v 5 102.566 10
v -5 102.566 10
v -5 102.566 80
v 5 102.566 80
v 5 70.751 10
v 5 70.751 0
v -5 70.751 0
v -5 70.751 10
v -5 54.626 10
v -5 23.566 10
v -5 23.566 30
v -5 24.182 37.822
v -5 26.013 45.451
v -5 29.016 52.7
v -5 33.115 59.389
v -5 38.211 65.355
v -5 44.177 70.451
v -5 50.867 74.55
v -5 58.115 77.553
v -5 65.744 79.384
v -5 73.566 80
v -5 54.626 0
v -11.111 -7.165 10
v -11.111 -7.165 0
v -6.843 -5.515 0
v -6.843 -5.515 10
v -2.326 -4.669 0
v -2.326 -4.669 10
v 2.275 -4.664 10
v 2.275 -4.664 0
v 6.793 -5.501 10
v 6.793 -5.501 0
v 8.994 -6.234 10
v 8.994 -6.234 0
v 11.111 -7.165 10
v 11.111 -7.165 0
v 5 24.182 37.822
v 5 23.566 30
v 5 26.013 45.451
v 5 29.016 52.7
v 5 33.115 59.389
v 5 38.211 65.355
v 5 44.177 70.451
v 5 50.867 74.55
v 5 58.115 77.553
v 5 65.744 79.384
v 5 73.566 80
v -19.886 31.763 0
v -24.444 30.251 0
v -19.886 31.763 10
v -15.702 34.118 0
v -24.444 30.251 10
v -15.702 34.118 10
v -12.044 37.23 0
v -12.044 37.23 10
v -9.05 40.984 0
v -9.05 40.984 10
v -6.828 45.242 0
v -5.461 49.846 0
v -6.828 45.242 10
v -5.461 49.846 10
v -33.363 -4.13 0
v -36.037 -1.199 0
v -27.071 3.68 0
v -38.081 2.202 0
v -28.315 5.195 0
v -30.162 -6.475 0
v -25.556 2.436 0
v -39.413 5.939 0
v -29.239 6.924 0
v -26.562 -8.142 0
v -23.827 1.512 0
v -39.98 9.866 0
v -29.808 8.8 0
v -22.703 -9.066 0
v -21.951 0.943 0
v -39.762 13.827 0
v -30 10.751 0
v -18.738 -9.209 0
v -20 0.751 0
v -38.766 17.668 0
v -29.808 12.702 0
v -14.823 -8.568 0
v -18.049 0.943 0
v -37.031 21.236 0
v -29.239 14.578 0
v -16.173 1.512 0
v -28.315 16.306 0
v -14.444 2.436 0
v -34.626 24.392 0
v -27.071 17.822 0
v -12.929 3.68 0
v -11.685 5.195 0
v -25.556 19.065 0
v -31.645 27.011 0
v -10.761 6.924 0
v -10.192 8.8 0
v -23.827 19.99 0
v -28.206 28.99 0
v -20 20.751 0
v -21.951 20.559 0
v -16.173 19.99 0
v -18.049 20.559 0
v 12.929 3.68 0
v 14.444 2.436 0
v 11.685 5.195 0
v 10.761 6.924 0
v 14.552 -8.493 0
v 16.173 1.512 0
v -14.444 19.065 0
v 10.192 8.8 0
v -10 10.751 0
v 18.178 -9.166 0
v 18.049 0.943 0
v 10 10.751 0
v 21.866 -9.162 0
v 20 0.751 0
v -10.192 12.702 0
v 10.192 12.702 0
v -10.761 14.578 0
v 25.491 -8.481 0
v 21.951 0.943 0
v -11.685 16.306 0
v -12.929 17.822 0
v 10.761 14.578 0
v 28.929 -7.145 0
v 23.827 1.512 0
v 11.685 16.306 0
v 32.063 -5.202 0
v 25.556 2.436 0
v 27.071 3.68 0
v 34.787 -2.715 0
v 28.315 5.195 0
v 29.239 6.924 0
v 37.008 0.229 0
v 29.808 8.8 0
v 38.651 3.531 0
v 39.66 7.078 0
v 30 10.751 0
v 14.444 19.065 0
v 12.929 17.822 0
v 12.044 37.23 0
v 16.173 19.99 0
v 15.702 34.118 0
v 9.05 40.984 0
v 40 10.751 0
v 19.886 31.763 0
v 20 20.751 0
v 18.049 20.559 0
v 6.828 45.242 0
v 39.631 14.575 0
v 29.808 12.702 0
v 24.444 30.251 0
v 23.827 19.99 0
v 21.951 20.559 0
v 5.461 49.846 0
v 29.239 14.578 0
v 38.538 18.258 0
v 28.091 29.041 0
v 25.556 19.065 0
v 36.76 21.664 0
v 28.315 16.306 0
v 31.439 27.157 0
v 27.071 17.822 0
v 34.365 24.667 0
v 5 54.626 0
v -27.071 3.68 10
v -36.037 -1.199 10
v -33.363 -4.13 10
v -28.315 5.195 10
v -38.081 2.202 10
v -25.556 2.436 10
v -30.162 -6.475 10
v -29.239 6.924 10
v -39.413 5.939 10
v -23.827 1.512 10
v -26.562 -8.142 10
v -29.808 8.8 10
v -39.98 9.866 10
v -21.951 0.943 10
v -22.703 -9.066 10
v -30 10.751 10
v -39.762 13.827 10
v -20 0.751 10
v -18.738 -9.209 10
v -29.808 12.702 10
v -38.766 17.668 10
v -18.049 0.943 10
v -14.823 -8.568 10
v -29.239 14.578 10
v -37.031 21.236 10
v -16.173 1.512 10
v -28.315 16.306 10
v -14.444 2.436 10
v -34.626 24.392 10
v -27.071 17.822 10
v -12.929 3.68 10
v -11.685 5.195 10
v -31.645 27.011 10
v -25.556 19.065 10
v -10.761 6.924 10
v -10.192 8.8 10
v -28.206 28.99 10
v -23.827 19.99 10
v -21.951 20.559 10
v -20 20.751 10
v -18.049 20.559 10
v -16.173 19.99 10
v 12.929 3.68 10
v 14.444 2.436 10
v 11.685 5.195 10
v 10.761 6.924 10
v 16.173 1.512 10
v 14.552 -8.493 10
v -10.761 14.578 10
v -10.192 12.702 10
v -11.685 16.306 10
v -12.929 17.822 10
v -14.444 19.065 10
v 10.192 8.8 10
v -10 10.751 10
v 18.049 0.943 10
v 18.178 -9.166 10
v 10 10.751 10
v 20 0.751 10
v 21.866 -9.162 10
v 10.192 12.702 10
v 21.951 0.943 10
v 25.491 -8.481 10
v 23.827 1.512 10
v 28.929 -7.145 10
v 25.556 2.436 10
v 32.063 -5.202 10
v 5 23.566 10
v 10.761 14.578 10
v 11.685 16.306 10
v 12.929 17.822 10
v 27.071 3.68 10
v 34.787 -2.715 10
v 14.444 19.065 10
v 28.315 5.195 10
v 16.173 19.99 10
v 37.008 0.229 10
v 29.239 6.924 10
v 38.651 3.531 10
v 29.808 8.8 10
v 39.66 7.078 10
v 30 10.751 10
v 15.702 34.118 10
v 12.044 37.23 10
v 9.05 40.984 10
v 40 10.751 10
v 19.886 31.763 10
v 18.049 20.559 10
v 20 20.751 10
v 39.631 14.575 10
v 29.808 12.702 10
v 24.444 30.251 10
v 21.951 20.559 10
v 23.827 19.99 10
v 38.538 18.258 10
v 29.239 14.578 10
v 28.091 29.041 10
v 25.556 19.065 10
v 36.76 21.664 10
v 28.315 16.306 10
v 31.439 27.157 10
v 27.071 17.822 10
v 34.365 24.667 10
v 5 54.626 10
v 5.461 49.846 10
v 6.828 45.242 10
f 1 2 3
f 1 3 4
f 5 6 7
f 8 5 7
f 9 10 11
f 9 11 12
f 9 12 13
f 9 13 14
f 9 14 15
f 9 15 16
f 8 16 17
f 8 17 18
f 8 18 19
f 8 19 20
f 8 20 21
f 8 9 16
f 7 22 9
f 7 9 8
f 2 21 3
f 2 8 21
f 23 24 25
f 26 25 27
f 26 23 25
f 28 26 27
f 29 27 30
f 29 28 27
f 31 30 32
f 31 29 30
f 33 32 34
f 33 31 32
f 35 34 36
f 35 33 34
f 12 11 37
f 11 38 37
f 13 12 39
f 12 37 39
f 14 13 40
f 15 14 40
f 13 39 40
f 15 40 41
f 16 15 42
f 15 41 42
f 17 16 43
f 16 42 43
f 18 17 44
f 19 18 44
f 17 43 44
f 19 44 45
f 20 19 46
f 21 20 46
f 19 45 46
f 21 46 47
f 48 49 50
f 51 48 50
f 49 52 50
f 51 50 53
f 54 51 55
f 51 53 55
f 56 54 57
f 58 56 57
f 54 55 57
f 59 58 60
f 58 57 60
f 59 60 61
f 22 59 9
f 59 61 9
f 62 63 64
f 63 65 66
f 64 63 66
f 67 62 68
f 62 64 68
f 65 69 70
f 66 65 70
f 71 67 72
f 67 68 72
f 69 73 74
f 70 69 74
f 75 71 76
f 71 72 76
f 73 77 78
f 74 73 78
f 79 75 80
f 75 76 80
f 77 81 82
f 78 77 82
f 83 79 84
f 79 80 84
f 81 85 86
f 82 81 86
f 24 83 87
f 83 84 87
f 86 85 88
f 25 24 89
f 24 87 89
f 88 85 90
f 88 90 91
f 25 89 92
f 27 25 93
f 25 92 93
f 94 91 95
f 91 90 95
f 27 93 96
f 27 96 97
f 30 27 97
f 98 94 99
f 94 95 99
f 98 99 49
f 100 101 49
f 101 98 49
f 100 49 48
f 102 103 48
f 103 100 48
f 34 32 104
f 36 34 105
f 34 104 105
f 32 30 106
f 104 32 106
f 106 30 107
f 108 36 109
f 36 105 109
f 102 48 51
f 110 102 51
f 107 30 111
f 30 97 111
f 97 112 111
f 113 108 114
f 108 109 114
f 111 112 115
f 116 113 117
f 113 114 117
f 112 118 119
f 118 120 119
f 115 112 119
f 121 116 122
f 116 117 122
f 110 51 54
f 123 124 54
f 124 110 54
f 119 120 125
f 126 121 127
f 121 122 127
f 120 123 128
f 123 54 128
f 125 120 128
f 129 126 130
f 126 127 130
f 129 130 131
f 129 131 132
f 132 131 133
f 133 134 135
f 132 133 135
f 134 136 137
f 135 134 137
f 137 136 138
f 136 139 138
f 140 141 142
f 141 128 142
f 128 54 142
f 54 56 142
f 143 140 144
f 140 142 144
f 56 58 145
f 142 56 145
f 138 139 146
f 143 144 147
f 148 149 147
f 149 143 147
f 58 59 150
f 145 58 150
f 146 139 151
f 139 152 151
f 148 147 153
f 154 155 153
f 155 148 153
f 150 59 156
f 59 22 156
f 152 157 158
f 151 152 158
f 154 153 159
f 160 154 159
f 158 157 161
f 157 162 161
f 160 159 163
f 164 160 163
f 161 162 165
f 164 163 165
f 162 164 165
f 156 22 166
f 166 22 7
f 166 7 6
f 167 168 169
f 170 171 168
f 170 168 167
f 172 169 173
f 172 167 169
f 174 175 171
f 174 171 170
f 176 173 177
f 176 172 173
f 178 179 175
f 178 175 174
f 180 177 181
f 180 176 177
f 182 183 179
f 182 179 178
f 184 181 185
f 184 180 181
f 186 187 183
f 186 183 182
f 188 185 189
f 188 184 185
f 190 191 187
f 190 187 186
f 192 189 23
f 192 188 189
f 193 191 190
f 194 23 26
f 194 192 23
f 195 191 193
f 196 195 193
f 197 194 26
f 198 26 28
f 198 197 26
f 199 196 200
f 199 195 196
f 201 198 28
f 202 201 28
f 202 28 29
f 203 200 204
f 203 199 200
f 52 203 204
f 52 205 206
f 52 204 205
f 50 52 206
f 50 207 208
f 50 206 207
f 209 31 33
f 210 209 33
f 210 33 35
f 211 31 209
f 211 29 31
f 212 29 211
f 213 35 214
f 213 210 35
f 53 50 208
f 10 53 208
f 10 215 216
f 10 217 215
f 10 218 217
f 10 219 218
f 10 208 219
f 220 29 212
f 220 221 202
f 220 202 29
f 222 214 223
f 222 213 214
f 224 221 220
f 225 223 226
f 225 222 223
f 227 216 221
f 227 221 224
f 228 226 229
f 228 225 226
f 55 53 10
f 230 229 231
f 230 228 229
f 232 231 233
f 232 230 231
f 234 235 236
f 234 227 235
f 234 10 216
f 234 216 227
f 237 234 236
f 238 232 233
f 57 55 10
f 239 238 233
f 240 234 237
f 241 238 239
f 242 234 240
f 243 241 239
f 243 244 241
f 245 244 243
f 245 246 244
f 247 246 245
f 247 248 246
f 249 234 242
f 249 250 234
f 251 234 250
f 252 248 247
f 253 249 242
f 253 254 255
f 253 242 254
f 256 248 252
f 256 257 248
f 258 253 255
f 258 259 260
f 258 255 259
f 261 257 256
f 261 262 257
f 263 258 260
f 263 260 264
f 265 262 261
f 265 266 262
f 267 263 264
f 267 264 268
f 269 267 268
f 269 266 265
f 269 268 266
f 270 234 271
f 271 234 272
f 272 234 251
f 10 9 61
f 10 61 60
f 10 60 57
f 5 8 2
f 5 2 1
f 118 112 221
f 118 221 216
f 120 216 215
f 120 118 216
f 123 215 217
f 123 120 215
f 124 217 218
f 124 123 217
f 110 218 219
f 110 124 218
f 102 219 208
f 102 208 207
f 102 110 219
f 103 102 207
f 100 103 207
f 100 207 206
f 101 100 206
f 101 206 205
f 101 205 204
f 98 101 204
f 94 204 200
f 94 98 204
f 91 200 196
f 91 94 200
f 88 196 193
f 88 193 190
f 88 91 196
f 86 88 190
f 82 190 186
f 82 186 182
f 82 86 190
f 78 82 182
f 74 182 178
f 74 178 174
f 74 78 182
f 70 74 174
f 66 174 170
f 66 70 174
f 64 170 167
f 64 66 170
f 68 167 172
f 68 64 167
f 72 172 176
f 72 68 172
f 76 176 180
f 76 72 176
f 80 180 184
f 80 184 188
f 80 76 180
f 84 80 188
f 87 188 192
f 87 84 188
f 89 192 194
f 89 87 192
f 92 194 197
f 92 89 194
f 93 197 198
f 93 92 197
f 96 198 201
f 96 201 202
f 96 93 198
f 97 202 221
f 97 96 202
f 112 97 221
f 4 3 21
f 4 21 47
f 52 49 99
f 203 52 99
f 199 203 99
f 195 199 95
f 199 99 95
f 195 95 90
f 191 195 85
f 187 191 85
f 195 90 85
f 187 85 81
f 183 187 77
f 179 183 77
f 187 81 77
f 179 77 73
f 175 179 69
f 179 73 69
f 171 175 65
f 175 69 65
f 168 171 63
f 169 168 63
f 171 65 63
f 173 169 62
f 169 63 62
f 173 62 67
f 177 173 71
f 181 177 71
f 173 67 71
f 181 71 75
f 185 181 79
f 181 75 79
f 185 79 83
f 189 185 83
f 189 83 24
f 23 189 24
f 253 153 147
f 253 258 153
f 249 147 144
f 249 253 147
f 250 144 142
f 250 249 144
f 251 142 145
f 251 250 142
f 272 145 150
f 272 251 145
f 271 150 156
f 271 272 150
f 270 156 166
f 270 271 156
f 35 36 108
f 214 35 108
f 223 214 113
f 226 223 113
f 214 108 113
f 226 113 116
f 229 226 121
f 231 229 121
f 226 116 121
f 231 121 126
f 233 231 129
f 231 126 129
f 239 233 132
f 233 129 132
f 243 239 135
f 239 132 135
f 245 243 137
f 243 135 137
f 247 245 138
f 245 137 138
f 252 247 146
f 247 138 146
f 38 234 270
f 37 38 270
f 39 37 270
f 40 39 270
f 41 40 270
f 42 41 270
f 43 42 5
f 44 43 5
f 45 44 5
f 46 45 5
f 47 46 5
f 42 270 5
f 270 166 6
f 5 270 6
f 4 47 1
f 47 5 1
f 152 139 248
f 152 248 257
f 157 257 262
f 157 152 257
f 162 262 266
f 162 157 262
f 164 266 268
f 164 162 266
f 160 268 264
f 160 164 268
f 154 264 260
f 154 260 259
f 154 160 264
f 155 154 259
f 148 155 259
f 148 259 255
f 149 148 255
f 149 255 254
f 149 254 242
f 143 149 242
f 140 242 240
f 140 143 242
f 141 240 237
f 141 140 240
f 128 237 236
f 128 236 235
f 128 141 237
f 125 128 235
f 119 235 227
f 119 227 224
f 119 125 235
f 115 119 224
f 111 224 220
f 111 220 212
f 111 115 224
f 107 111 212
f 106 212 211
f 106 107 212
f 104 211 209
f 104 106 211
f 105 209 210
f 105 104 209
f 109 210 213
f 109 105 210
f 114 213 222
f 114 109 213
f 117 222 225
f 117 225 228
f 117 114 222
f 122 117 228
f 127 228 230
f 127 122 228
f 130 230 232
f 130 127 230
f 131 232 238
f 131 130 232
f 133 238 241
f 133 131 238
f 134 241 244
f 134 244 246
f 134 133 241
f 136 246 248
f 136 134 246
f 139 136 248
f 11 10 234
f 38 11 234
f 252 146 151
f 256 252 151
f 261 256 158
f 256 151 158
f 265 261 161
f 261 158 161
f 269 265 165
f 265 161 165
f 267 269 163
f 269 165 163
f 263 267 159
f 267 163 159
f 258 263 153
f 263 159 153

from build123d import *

# Parameters (mm, degrees)
F0_R     = 10
F1_DEPTH = 10
F2_R     = 25
F3_R     = 25
F4_W     = 10
F4_H     = 79.0000073612
F5_DEPTH = 70
F6_R     = 50


with BuildPart() as f1:
    # F0 (on Top) → F1 (new body)
    with BuildSketch(Plane.XY):
        with BuildLine():
            Line((-5, 10.7507640496), (0, 10.7507640496))
            ThreePointArc((0, 10.7507640496), (-1.2917130661, 17.8218318615), (-5, 23.9795206049))
            Line((-5, 23.9795206049), (-5, 10.7507640496))
        make_face()
        with BuildLine():
            Line((5, 10.7507640496), (0, 10.7507640496))
            ThreePointArc((0, 10.7507640496), (20, -9.2492359504), (40, 10.7507640496))
            ThreePointArc((40, 10.7507640496), (27.0710678119, 29.4590509835), (5, 23.9795206049))
            Line((5, 23.9795206049), (5, 10.7507640496))
        make_face()
        with Locations((20, 10.7507640496)):
            Circle(F0_R, mode=Mode.SUBTRACT)
        with BuildLine():
            ThreePointArc((-5, 23.9795206049), (-1.2917130661, 17.8218318615), (0, 10.7507640496))
            ThreePointArc((0, 10.7507640496), (1.2917130661, 17.8218318615), (5, 23.9795206049))
            Line((5, 23.9795206049), (5, 70.7507640496))
            Line((5, 70.7507640496), (-5, 70.7507640496))
            Line((-5, 70.7507640496), (-5, 23.9795206049))
        make_face()
        with BuildLine():
            ThreePointArc((-5, 23.9795206049), (-38.7082869339, 3.6796962377), (0, 10.7507640496))
            Line((0, 10.7507640496), (-5, 10.7507640496))
            Line((-5, 10.7507640496), (-5, 23.9795206049))
        make_face()
        with Locations((-20, 10.7507640496)):
            Circle(F0_R, mode=Mode.SUBTRACT)
        with BuildLine():
            ThreePointArc((5, 23.9795206049), (1.2917130661, 17.8218318615), (0, 10.7507640496))
            Line((0, 10.7507640496), (5, 10.7507640496))
            Line((5, 10.7507640496), (5, 23.9795206049))
        make_face()
    extrude(amount=F1_DEPTH)

    # F2
    f2_edges = [f1.edges().sort_by_distance(p)[0] for p in [
        (0, 10.750764, 5),
    ]]
    fillet(f2_edges, radius=F2_R)

    # F3
    f3_edges = [f1.edges().sort_by_distance(p)[0] for p in [
        (-5, 23.979521, 5),
        (5, 23.979521, 5),
    ]]
    fillet(f3_edges, radius=F3_R)

    # F4 (on face) → F5 (join)
    with BuildSketch(Plane.XY.offset(10)):
        with Locations((0, 63.0660597235)):
            Rectangle(F4_W, F4_H)
    extrude(amount=F5_DEPTH)

    # F6
    f6_edges = [f1.edges().sort_by_distance(p)[0] for p in [
        (0, 23.566056, 80),
    ]]
    fillet(f6_edges, radius=F6_R)


solid = f1.part
